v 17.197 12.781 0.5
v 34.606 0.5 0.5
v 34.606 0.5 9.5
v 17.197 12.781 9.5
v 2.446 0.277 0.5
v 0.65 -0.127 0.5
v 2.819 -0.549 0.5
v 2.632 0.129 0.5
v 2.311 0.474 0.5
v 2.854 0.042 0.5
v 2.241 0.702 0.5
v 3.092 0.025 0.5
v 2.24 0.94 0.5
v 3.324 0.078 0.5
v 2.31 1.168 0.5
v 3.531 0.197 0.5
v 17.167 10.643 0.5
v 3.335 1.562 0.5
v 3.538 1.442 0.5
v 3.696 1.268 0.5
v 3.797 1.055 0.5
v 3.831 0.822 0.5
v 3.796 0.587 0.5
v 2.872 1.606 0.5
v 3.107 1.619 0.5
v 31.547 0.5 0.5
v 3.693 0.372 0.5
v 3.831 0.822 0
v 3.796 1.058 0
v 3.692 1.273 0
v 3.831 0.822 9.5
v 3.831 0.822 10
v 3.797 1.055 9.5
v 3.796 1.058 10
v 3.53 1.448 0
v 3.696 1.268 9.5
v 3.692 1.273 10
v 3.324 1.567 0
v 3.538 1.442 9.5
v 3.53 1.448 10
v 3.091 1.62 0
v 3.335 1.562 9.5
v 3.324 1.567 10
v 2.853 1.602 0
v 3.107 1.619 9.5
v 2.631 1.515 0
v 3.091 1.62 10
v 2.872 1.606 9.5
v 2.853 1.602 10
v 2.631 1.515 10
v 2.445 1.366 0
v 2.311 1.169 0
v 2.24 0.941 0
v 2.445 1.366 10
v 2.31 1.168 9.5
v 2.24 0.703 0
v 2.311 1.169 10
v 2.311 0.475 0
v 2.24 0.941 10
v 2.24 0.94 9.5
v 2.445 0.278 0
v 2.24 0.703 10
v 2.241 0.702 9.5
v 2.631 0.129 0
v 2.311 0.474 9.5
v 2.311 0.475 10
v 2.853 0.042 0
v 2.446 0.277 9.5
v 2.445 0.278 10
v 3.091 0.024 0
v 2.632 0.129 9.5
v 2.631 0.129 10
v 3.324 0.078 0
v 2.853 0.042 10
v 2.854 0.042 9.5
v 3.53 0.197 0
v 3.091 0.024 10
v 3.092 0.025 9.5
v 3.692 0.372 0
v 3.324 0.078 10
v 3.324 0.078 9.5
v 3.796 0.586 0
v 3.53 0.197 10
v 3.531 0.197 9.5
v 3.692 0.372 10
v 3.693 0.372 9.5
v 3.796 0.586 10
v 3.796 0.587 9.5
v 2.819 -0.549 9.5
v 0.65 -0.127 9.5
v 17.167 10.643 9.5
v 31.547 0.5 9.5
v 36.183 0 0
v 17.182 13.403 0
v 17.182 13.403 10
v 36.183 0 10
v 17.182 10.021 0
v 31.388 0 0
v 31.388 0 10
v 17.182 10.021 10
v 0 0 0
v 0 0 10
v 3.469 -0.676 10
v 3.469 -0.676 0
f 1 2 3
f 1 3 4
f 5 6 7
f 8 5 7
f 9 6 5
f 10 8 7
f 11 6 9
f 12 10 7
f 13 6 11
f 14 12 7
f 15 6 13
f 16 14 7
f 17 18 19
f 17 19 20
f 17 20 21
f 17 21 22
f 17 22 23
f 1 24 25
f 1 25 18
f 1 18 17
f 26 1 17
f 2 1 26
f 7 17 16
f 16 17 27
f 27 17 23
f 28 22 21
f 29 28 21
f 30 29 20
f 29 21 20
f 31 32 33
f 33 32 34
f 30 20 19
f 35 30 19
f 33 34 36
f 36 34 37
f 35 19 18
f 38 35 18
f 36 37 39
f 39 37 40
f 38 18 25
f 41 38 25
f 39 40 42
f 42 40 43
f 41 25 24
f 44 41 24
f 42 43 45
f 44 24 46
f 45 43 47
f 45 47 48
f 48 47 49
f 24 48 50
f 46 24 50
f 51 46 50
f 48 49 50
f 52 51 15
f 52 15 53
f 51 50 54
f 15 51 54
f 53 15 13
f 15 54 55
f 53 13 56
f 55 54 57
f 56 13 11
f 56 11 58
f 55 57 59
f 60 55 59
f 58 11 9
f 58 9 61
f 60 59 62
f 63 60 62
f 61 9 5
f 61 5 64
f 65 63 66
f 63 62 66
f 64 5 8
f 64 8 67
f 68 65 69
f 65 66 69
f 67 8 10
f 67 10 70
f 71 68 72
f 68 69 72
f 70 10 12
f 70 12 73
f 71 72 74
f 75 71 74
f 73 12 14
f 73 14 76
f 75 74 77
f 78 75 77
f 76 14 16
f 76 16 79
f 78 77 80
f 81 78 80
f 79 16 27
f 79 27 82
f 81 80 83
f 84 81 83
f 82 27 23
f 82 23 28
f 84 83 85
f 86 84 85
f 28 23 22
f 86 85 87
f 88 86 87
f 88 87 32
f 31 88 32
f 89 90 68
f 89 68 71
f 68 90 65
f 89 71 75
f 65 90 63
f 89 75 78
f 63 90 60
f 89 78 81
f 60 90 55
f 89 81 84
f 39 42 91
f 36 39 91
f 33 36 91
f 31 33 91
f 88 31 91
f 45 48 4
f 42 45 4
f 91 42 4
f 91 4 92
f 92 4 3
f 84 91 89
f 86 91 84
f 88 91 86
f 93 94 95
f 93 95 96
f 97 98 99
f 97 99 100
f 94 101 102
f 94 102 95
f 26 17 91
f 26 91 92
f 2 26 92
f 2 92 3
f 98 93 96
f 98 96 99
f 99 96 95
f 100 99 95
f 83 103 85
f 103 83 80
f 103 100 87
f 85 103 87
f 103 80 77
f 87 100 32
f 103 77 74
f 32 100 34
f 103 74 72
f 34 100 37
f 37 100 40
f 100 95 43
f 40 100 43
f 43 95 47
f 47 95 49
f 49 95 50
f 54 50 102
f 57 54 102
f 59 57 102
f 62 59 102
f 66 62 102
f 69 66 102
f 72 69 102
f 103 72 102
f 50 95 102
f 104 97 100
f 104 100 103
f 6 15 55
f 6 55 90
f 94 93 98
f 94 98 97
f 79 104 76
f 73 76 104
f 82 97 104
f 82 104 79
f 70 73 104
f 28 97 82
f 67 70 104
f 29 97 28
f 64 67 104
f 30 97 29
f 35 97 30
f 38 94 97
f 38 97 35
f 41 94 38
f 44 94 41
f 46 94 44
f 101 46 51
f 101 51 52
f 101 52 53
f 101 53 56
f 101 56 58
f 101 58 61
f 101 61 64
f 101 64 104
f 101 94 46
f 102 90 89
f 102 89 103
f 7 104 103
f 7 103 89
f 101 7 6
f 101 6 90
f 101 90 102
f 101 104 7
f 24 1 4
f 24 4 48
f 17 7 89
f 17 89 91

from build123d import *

# Parameters (mm, degrees)
BOSS_EXTRUDE1_DEPTH = 10
SKETCH3_R           = 0.8
CUT_EXTRUDE1_DEPTH  = 10
SHELL3_START        = 0.5
SHELL3_DEPTH        = 9


# Read off the part's stored shape, not the designer's step: Shell3
with BuildPart() as part:
    # Sketch1 → Boss-Extrude1 (new body)
    with BuildSketch(Plane.XY):
        Polygon((0, 0), (17.18164136, 13.403124393), (36.182713788, 0), (31.388050652, 0), (17.18164136, 10.021027584), (3.469055949, -0.675941592), align=None)
    extrude(amount=BOSS_EXTRUDE1_DEPTH)

    # Sketch3 → Cut-Extrude1 (cut)
    with BuildSketch(Plane.XY.offset(10)):
        with Locations((3.03145353, 0.822261973)):
            Circle(SKETCH3_R)
    extrude(amount=-CUT_EXTRUDE1_DEPTH, mode=Mode.SUBTRACT)

    # Shell3 outline → Shell3 (cut)
    with BuildSketch(Plane.XY.offset(SHELL3_START)):
        with BuildLine():
            ThreePointArc((2.871909903, 1.606191709), (3.523511931, 0.19148584), (2.309922075, 1.167793967))
            Line((2.309922075, 1.167793967), (0.650444145, -0.126738299))
            Line((0.650444145, -0.126738299), (2.818611804, -0.549203293))
            Line((2.818611804, -0.549203293), (17.16665434, 10.643475851))
            Line((17.16665434, 10.643475851), (31.546653635, 0.5))
            Line((31.546653635, 0.5), (34.606450873, 0.5))
            Line((34.606450873, 0.5), (17.196628379, 12.780676126))
            Line((17.196628379, 12.780676126), (2.871909903, 1.606191709))
        make_face()
    extrude(amount=SHELL3_DEPTH, mode=Mode.SUBTRACT)


solid = part.part
